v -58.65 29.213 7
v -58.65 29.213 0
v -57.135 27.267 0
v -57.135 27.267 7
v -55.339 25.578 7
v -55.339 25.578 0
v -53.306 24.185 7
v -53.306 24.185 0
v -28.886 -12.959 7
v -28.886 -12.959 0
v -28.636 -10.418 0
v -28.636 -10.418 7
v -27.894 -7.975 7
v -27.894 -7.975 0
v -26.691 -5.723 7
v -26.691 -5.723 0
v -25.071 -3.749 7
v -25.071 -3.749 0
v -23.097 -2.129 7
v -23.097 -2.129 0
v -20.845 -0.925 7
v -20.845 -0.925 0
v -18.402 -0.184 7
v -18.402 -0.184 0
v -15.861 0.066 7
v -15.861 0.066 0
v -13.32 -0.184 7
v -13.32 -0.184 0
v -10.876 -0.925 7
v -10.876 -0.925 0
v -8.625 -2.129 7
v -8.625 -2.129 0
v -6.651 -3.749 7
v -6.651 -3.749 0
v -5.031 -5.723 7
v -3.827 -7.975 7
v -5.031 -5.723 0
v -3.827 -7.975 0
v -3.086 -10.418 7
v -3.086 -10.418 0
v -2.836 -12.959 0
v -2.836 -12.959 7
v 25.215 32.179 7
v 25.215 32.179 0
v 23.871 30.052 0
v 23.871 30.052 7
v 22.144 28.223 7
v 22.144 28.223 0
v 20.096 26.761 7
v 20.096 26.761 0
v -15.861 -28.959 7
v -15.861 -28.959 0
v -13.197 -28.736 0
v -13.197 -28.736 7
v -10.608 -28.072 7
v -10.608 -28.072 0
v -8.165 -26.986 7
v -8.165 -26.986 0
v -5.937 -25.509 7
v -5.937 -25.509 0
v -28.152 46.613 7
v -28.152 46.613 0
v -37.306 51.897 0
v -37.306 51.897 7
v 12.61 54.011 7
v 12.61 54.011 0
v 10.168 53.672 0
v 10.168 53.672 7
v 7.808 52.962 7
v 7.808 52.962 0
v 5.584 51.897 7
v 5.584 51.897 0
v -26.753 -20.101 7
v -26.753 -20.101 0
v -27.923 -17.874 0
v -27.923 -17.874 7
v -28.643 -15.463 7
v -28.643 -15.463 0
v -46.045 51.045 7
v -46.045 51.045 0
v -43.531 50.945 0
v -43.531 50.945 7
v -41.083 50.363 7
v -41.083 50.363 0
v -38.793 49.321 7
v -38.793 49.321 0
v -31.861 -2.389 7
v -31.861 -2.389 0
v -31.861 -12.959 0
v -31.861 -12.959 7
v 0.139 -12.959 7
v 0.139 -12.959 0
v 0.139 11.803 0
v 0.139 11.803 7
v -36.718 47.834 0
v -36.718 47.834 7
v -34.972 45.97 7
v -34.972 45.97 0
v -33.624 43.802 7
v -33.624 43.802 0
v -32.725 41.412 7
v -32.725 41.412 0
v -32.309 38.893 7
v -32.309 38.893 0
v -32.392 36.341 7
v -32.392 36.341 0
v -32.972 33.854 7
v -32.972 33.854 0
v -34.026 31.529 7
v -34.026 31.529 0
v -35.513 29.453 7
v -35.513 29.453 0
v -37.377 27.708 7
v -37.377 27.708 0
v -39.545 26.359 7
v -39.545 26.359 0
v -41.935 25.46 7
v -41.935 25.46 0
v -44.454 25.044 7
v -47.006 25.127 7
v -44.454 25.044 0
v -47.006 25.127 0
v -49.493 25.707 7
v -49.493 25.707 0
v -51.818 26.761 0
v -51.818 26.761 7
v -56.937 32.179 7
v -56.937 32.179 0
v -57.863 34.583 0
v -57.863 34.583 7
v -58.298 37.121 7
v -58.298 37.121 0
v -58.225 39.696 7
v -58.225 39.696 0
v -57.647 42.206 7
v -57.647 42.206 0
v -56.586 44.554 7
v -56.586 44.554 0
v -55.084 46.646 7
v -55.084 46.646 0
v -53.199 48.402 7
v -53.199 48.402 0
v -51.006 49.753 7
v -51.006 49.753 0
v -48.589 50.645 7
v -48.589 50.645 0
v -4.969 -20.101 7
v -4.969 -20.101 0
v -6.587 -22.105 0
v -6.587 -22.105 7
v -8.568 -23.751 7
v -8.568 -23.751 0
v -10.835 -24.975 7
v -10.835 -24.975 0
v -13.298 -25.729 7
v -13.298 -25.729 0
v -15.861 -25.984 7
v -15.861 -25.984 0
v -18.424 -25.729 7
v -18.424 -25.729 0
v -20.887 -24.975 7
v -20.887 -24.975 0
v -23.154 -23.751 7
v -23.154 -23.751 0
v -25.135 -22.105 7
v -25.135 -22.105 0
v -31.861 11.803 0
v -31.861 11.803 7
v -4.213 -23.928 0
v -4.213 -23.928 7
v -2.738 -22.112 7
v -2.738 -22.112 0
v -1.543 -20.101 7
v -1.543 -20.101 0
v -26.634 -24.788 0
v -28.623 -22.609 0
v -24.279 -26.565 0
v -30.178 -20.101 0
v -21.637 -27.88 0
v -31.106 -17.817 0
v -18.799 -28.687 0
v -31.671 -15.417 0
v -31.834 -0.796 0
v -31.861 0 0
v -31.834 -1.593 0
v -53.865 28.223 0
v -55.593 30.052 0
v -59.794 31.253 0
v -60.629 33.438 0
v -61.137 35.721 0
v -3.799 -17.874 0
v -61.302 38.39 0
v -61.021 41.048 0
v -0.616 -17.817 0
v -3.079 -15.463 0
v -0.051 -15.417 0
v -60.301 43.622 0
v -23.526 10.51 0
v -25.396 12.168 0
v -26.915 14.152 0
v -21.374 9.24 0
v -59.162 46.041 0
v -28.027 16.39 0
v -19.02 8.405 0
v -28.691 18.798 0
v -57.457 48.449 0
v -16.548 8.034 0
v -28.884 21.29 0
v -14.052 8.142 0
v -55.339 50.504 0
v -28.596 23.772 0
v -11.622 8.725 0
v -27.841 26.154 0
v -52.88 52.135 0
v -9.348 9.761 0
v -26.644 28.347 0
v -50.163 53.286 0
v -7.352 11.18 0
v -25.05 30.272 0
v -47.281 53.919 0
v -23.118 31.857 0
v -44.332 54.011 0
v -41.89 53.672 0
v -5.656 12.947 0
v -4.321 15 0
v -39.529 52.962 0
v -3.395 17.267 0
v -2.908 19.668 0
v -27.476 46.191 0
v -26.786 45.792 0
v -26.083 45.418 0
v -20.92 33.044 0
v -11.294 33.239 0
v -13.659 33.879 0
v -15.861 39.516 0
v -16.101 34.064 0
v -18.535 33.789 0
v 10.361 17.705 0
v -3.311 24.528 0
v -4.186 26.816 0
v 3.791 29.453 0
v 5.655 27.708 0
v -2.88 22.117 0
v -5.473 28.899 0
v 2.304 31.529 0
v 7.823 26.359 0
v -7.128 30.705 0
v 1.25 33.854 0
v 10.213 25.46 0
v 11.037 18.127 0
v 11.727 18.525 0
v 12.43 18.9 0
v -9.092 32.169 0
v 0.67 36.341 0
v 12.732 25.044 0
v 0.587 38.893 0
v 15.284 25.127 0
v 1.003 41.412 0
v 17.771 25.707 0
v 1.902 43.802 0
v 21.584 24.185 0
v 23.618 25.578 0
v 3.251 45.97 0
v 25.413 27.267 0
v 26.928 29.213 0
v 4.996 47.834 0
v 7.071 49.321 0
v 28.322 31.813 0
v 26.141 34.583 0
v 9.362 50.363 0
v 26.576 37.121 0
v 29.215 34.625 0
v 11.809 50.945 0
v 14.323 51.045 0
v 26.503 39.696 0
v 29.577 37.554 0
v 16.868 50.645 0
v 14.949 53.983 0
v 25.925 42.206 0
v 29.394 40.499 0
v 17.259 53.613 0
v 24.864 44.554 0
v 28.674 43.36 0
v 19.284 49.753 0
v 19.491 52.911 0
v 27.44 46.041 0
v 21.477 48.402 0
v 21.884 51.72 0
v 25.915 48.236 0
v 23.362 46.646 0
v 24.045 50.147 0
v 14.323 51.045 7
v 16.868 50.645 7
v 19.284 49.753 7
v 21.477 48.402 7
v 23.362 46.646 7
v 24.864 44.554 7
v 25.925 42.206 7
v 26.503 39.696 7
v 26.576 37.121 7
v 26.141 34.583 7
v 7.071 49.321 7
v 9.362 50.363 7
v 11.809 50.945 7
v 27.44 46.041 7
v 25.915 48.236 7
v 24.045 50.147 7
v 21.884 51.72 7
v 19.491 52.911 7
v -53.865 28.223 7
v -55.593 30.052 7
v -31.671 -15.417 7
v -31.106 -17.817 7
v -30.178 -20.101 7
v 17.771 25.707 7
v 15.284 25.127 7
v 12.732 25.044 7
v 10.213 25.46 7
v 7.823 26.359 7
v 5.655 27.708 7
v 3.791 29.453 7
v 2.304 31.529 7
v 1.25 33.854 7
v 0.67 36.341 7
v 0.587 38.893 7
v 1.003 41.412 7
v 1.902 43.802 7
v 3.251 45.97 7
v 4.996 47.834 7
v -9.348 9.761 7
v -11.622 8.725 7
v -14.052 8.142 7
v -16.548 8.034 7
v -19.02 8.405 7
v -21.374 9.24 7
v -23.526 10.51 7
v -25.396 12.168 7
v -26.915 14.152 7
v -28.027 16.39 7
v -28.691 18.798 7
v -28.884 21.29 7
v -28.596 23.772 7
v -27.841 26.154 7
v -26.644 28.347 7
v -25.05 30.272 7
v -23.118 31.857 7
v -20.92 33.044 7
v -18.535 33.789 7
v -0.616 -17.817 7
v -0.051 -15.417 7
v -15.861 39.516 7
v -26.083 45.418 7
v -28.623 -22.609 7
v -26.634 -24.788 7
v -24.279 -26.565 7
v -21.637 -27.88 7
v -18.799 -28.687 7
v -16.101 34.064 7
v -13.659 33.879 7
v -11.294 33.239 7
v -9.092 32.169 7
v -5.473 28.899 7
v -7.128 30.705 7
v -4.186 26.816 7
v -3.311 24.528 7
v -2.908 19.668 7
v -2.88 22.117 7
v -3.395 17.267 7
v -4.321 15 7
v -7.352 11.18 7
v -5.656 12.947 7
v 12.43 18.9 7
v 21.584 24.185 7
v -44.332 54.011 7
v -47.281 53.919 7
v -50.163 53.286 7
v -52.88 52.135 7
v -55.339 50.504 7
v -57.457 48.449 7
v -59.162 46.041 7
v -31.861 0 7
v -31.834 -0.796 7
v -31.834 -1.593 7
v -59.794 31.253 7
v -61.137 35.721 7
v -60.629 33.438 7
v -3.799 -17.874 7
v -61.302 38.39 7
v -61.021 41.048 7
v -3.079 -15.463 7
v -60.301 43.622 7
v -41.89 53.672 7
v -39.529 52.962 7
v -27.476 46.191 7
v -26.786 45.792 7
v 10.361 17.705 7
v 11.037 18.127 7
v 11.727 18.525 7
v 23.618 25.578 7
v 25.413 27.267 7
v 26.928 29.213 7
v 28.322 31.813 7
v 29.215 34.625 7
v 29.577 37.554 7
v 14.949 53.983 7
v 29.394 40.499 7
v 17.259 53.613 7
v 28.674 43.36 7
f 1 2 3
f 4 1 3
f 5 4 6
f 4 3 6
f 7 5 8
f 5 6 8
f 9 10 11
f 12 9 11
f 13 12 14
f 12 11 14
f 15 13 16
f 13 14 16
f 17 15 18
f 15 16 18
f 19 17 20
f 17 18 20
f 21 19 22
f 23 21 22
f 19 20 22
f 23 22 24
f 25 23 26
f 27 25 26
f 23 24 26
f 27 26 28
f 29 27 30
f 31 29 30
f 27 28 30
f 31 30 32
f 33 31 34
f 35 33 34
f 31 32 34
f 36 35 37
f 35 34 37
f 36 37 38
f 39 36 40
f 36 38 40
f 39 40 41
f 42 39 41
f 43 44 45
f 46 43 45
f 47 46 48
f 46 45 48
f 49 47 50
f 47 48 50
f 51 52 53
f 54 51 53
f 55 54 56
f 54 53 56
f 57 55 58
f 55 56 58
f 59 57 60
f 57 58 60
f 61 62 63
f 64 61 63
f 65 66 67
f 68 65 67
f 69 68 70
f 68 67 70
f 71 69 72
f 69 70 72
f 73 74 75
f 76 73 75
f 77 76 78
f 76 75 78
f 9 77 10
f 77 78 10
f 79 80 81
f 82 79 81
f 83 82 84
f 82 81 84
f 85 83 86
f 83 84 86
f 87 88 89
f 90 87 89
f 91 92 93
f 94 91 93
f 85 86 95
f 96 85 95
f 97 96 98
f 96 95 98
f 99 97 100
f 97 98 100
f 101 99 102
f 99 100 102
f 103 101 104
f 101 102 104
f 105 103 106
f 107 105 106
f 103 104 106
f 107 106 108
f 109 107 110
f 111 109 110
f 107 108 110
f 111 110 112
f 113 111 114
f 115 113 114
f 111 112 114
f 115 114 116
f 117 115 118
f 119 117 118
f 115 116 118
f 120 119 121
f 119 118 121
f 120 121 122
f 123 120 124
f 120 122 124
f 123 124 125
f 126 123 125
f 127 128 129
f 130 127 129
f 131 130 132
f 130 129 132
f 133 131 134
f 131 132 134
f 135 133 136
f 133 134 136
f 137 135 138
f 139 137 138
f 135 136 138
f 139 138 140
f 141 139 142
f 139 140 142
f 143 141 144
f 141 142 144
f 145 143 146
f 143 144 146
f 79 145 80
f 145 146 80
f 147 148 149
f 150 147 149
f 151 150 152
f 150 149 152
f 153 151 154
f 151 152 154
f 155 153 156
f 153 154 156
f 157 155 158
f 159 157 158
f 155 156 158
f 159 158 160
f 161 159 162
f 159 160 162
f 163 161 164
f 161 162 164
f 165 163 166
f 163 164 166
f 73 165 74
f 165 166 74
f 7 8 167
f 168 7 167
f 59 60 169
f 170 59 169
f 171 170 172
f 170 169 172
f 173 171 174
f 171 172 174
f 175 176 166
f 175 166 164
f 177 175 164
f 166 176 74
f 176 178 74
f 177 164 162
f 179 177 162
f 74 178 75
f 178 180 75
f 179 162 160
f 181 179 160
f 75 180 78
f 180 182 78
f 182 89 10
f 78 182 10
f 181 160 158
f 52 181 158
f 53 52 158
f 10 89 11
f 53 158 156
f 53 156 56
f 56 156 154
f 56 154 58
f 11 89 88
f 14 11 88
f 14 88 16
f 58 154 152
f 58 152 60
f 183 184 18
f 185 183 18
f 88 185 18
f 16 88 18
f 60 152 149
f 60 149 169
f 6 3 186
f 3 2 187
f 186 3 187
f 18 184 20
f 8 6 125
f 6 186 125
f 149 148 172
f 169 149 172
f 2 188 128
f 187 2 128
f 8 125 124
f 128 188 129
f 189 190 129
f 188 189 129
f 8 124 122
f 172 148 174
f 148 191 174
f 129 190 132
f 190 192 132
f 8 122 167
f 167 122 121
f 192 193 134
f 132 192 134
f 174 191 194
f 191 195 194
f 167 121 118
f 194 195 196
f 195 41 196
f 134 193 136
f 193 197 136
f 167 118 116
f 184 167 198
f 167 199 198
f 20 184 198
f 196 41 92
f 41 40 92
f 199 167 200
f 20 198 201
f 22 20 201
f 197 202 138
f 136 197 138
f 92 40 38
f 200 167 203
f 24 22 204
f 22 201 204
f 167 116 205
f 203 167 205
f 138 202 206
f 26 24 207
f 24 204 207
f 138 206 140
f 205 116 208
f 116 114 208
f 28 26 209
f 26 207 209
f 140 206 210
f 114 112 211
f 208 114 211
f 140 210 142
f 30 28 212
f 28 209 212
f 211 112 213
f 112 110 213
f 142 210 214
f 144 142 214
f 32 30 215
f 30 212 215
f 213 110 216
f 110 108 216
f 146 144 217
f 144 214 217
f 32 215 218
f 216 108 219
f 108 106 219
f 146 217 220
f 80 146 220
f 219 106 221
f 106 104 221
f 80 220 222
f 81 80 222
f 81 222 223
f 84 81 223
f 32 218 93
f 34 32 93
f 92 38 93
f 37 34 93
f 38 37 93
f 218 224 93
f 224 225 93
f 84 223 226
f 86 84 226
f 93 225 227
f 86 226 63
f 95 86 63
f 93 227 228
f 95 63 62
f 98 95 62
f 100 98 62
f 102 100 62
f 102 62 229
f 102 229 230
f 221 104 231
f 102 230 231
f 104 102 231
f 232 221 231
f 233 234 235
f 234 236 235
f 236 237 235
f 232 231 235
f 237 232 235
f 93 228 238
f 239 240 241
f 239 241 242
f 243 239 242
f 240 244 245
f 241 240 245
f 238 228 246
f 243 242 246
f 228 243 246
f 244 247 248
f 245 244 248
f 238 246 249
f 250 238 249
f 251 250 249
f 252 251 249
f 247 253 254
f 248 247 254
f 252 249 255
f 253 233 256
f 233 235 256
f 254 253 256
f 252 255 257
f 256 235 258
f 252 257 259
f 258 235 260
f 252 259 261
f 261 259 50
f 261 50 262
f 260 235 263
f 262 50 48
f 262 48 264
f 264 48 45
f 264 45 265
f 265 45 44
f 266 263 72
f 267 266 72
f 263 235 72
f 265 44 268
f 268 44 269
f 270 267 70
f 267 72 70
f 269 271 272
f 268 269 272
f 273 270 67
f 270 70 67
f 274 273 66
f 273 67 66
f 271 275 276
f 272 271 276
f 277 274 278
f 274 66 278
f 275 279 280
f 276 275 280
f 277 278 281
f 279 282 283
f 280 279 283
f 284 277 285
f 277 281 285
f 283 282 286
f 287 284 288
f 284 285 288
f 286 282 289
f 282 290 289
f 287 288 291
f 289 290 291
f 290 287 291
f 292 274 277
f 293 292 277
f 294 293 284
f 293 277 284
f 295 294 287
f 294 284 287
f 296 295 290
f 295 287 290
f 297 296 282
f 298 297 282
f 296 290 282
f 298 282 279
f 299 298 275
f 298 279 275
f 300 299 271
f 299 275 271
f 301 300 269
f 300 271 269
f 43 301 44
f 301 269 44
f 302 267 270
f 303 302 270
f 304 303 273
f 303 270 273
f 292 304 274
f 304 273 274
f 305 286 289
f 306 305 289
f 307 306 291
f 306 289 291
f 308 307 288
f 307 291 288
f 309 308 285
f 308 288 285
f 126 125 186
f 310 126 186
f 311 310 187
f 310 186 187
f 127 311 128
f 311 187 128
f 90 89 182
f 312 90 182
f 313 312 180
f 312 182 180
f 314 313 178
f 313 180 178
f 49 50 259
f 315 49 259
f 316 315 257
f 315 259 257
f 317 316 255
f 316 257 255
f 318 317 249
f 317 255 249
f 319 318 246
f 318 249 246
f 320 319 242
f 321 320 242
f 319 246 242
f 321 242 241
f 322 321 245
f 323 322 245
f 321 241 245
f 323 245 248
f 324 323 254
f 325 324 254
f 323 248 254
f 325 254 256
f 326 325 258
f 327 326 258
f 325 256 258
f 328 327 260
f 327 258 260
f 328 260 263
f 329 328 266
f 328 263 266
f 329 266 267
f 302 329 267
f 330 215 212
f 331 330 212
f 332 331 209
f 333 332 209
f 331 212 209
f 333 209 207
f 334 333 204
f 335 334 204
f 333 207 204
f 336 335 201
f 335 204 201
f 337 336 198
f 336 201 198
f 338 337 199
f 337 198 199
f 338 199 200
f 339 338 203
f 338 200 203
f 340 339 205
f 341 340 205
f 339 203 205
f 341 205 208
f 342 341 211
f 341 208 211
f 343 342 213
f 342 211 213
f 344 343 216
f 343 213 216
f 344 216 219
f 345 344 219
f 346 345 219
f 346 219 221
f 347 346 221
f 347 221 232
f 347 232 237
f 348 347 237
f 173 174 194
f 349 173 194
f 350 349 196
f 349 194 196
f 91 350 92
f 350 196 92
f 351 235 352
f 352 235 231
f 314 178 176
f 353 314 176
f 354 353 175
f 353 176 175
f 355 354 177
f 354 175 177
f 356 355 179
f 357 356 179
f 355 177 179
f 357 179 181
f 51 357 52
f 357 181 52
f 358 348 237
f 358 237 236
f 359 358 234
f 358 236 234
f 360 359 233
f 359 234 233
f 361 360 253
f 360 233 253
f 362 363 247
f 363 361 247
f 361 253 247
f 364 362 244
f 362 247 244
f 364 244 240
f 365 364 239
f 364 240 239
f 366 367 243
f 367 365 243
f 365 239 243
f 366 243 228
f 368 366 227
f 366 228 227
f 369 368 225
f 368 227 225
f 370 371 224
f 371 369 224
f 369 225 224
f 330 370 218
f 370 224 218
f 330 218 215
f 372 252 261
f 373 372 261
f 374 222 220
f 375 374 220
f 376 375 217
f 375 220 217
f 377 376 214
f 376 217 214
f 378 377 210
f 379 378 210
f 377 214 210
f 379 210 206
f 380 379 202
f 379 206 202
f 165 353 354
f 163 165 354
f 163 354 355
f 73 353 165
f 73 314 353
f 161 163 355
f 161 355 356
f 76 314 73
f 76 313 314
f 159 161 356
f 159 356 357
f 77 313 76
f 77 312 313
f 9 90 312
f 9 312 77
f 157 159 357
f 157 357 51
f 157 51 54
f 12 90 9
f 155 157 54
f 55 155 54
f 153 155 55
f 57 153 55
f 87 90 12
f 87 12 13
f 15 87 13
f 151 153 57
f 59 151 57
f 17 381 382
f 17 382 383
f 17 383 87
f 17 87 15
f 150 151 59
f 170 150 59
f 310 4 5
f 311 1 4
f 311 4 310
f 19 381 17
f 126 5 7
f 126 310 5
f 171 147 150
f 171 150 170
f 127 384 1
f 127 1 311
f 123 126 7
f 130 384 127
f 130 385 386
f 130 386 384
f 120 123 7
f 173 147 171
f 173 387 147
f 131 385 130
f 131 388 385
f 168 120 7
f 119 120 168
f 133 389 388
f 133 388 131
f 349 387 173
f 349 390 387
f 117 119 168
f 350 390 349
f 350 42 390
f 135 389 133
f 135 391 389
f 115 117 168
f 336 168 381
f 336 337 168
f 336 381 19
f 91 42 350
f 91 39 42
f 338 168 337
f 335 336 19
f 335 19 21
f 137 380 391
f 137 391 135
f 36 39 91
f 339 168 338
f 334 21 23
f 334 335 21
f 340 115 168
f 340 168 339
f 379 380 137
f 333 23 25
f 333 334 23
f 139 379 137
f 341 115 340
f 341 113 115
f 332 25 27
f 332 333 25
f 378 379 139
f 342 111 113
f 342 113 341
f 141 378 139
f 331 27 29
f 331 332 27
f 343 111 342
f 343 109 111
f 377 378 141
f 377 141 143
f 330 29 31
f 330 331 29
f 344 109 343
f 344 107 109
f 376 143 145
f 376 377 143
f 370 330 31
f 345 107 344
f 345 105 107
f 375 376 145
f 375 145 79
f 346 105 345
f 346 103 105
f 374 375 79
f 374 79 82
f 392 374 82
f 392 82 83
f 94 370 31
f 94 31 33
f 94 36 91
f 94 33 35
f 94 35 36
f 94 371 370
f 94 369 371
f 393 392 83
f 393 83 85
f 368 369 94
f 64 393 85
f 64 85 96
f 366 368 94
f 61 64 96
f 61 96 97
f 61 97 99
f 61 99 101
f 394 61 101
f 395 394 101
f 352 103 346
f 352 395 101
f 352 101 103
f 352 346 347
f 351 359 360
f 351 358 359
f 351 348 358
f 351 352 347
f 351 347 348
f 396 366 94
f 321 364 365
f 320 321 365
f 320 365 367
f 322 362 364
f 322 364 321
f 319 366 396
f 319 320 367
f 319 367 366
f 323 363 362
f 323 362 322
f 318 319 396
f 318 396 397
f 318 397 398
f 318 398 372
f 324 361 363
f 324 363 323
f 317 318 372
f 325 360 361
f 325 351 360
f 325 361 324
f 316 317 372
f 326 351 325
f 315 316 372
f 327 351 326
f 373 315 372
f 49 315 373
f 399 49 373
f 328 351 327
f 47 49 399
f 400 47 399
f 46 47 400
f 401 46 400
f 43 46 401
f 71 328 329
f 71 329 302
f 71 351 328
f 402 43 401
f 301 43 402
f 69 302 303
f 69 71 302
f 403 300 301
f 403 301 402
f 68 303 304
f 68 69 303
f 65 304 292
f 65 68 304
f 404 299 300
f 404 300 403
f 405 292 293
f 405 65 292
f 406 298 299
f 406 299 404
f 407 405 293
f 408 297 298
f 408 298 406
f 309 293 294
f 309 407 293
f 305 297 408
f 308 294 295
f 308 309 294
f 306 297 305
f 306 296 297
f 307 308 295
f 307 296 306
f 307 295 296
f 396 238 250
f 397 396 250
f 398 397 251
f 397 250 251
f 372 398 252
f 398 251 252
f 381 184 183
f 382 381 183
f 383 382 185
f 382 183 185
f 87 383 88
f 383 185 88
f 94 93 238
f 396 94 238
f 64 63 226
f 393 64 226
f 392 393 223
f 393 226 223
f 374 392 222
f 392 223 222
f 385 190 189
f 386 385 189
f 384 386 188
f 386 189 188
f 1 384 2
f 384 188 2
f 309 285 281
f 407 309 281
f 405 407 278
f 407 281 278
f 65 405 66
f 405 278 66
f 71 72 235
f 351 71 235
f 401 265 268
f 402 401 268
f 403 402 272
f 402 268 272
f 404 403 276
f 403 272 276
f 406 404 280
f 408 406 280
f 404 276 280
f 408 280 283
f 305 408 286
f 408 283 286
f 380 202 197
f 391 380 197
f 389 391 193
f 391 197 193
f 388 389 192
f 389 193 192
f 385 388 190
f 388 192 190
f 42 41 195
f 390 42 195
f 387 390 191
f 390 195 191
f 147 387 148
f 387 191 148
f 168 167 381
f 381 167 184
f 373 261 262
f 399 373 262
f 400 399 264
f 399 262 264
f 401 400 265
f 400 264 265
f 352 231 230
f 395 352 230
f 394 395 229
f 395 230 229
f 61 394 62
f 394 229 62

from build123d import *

# Parameters (mm, degrees)
F1_DEPTH        = 7
F1_COPIES_COUNT = 3


# Not quite as in the source:
# - a feature of the source that left no trace in its solid (it failed there, or was rolled back) is left out
# - a pattern or mirror of a feature is missing from the dataset's text; its kind, count and spacing are read off the source's solid


with BuildPart() as f1:
    # F0 (on Top) → F1 (new body)
    with BuildSketch(Plane.XY):
        with BuildLine():
            Line((0.1390978545, -12.9589841303), (0.1390978545, 21.0410158697))
            ThreePointArc((0.1390978545, 21.0410158697), (-15.8609021455, 5.0410158697), (-31.8609021455, 21.0410158697))
            Line((-31.8609021455, 21.0410158697), (-31.8609021455, 0))
            ThreePointArc((-31.8609021455, 0), (-31.8301791681, -1.1947273097), (-31.8609021455, -2.3894546193))
            Line((-31.8609021455, -2.3894546193), (-31.8609021455, -12.9589841303))
            ThreePointArc((-31.8609021455, -12.9589841303), (-15.8609021455, 3.0410158697), (0.1390978545, -12.9589841303))
        make_face()
        with BuildLine():
            Line((0.1390978545, 21.0410158697), (-2.8359021455, 21.0410158697))
            ThreePointArc((-2.8359021455, 21.0410158697), (-15.8609021455, 8.0160158697), (-28.8859021455, 21.0410158697))
            Line((-28.8859021455, 21.0410158697), (-31.8609021455, 21.0410158697))
            ThreePointArc((-31.8609021455, 21.0410158697), (-15.8609021455, 5.0410158697), (0.1390978545, 21.0410158697))
        make_face()
        with BuildLine():
            ThreePointArc((-28.8859021455, 21.0410158697), (-15.8609021455, 34.0660158697), (-2.8359021455, 21.0410158697))
            Line((-2.8359021455, 21.0410158697), (0.1390978545, 21.0410158697))
            ThreePointArc((0.1390978545, 21.0410158697), (-15.8609021455, 37.0410158697), (-31.8609021455, 21.0410158697))
            Line((-31.8609021455, 21.0410158697), (-28.8859021455, 21.0410158697))
        make_face()
        with BuildLine():
            Line((-2.8359021455, -12.9589841303), (0.1390978545, -12.9589841303))
            ThreePointArc((0.1390978545, -12.9589841303), (-15.8609021455, 3.0410158697), (-31.8609021455, -12.9589841303))
            Line((-31.8609021455, -12.9589841303), (-28.8859021455, -12.9589841303))
            ThreePointArc((-28.8859021455, -12.9589841303), (-15.8609021455, 0.0660158697), (-2.8359021455, -12.9589841303))
        make_face()
        with BuildLine():
            Line((-28.8859021455, -12.9589841303), (-31.8609021455, -12.9589841303))
            ThreePointArc((-31.8609021455, -12.9589841303), (-31.4346103213, -16.6277187425), (-30.1784504386, -20.1009594084))
            Line((-30.1784504386, -20.1009594084), (-26.7532303689, -20.1009594084))
            ThreePointArc((-26.7532303689, -20.1009594084), (-28.3413508576, -16.6857823466), (-28.8859021455, -12.9589841303))
        make_face()
        with BuildLine():
            ThreePointArc((-1.5433538524, -20.1009594084), (-0.2871939697, -16.6277187425), (0.1390978545, -12.9589841303))
            Line((0.1390978545, -12.9589841303), (-2.8359021455, -12.9589841303))
            ThreePointArc((-2.8359021455, -12.9589841303), (-3.3804534334, -16.6857823466), (-4.9685739221, -20.1009594084))
            Line((-4.9685739221, -20.1009594084), (-1.5433538524, -20.1009594084))
        make_face()
        with BuildLine():
            ThreePointArc((-5.9366183214, -25.5092267804), (-3.4420074647, -23.0471482302), (-1.5433538524, -20.1009594084))
            Line((-1.5433538524, -20.1009594084), (-4.9685739221, -20.1009594084))
            ThreePointArc((-4.9685739221, -20.1009594084), (-15.8609021455, -25.9839841303), (-26.7532303689, -20.1009594084))
            Line((-26.7532303689, -20.1009594084), (-30.1784504386, -20.1009594084))
            ThreePointArc((-30.1784504386, -20.1009594084), (-24.2789897171, -26.5654458906), (-15.8609022277, -28.9589841303))
            ThreePointArc((-15.8609022277, -28.9589841303), (-10.6075167236, -28.0719567567), (-5.9366183214, -25.5092267804))
        make_face()
    extrude(amount=F1_DEPTH)

    # F1_copies: F1 ×3 about axis
    f1_copies_axis = Axis((-15.860902, 21.041016, 0), (0, 0, 1))


with BuildPart() as f1_1:
    add(f1.part)
    for i in range(1, F1_COPIES_COUNT):
        add(f1.part.rotate(f1_copies_axis, i * 360 / F1_COPIES_COUNT))


solid = f1_1.part
